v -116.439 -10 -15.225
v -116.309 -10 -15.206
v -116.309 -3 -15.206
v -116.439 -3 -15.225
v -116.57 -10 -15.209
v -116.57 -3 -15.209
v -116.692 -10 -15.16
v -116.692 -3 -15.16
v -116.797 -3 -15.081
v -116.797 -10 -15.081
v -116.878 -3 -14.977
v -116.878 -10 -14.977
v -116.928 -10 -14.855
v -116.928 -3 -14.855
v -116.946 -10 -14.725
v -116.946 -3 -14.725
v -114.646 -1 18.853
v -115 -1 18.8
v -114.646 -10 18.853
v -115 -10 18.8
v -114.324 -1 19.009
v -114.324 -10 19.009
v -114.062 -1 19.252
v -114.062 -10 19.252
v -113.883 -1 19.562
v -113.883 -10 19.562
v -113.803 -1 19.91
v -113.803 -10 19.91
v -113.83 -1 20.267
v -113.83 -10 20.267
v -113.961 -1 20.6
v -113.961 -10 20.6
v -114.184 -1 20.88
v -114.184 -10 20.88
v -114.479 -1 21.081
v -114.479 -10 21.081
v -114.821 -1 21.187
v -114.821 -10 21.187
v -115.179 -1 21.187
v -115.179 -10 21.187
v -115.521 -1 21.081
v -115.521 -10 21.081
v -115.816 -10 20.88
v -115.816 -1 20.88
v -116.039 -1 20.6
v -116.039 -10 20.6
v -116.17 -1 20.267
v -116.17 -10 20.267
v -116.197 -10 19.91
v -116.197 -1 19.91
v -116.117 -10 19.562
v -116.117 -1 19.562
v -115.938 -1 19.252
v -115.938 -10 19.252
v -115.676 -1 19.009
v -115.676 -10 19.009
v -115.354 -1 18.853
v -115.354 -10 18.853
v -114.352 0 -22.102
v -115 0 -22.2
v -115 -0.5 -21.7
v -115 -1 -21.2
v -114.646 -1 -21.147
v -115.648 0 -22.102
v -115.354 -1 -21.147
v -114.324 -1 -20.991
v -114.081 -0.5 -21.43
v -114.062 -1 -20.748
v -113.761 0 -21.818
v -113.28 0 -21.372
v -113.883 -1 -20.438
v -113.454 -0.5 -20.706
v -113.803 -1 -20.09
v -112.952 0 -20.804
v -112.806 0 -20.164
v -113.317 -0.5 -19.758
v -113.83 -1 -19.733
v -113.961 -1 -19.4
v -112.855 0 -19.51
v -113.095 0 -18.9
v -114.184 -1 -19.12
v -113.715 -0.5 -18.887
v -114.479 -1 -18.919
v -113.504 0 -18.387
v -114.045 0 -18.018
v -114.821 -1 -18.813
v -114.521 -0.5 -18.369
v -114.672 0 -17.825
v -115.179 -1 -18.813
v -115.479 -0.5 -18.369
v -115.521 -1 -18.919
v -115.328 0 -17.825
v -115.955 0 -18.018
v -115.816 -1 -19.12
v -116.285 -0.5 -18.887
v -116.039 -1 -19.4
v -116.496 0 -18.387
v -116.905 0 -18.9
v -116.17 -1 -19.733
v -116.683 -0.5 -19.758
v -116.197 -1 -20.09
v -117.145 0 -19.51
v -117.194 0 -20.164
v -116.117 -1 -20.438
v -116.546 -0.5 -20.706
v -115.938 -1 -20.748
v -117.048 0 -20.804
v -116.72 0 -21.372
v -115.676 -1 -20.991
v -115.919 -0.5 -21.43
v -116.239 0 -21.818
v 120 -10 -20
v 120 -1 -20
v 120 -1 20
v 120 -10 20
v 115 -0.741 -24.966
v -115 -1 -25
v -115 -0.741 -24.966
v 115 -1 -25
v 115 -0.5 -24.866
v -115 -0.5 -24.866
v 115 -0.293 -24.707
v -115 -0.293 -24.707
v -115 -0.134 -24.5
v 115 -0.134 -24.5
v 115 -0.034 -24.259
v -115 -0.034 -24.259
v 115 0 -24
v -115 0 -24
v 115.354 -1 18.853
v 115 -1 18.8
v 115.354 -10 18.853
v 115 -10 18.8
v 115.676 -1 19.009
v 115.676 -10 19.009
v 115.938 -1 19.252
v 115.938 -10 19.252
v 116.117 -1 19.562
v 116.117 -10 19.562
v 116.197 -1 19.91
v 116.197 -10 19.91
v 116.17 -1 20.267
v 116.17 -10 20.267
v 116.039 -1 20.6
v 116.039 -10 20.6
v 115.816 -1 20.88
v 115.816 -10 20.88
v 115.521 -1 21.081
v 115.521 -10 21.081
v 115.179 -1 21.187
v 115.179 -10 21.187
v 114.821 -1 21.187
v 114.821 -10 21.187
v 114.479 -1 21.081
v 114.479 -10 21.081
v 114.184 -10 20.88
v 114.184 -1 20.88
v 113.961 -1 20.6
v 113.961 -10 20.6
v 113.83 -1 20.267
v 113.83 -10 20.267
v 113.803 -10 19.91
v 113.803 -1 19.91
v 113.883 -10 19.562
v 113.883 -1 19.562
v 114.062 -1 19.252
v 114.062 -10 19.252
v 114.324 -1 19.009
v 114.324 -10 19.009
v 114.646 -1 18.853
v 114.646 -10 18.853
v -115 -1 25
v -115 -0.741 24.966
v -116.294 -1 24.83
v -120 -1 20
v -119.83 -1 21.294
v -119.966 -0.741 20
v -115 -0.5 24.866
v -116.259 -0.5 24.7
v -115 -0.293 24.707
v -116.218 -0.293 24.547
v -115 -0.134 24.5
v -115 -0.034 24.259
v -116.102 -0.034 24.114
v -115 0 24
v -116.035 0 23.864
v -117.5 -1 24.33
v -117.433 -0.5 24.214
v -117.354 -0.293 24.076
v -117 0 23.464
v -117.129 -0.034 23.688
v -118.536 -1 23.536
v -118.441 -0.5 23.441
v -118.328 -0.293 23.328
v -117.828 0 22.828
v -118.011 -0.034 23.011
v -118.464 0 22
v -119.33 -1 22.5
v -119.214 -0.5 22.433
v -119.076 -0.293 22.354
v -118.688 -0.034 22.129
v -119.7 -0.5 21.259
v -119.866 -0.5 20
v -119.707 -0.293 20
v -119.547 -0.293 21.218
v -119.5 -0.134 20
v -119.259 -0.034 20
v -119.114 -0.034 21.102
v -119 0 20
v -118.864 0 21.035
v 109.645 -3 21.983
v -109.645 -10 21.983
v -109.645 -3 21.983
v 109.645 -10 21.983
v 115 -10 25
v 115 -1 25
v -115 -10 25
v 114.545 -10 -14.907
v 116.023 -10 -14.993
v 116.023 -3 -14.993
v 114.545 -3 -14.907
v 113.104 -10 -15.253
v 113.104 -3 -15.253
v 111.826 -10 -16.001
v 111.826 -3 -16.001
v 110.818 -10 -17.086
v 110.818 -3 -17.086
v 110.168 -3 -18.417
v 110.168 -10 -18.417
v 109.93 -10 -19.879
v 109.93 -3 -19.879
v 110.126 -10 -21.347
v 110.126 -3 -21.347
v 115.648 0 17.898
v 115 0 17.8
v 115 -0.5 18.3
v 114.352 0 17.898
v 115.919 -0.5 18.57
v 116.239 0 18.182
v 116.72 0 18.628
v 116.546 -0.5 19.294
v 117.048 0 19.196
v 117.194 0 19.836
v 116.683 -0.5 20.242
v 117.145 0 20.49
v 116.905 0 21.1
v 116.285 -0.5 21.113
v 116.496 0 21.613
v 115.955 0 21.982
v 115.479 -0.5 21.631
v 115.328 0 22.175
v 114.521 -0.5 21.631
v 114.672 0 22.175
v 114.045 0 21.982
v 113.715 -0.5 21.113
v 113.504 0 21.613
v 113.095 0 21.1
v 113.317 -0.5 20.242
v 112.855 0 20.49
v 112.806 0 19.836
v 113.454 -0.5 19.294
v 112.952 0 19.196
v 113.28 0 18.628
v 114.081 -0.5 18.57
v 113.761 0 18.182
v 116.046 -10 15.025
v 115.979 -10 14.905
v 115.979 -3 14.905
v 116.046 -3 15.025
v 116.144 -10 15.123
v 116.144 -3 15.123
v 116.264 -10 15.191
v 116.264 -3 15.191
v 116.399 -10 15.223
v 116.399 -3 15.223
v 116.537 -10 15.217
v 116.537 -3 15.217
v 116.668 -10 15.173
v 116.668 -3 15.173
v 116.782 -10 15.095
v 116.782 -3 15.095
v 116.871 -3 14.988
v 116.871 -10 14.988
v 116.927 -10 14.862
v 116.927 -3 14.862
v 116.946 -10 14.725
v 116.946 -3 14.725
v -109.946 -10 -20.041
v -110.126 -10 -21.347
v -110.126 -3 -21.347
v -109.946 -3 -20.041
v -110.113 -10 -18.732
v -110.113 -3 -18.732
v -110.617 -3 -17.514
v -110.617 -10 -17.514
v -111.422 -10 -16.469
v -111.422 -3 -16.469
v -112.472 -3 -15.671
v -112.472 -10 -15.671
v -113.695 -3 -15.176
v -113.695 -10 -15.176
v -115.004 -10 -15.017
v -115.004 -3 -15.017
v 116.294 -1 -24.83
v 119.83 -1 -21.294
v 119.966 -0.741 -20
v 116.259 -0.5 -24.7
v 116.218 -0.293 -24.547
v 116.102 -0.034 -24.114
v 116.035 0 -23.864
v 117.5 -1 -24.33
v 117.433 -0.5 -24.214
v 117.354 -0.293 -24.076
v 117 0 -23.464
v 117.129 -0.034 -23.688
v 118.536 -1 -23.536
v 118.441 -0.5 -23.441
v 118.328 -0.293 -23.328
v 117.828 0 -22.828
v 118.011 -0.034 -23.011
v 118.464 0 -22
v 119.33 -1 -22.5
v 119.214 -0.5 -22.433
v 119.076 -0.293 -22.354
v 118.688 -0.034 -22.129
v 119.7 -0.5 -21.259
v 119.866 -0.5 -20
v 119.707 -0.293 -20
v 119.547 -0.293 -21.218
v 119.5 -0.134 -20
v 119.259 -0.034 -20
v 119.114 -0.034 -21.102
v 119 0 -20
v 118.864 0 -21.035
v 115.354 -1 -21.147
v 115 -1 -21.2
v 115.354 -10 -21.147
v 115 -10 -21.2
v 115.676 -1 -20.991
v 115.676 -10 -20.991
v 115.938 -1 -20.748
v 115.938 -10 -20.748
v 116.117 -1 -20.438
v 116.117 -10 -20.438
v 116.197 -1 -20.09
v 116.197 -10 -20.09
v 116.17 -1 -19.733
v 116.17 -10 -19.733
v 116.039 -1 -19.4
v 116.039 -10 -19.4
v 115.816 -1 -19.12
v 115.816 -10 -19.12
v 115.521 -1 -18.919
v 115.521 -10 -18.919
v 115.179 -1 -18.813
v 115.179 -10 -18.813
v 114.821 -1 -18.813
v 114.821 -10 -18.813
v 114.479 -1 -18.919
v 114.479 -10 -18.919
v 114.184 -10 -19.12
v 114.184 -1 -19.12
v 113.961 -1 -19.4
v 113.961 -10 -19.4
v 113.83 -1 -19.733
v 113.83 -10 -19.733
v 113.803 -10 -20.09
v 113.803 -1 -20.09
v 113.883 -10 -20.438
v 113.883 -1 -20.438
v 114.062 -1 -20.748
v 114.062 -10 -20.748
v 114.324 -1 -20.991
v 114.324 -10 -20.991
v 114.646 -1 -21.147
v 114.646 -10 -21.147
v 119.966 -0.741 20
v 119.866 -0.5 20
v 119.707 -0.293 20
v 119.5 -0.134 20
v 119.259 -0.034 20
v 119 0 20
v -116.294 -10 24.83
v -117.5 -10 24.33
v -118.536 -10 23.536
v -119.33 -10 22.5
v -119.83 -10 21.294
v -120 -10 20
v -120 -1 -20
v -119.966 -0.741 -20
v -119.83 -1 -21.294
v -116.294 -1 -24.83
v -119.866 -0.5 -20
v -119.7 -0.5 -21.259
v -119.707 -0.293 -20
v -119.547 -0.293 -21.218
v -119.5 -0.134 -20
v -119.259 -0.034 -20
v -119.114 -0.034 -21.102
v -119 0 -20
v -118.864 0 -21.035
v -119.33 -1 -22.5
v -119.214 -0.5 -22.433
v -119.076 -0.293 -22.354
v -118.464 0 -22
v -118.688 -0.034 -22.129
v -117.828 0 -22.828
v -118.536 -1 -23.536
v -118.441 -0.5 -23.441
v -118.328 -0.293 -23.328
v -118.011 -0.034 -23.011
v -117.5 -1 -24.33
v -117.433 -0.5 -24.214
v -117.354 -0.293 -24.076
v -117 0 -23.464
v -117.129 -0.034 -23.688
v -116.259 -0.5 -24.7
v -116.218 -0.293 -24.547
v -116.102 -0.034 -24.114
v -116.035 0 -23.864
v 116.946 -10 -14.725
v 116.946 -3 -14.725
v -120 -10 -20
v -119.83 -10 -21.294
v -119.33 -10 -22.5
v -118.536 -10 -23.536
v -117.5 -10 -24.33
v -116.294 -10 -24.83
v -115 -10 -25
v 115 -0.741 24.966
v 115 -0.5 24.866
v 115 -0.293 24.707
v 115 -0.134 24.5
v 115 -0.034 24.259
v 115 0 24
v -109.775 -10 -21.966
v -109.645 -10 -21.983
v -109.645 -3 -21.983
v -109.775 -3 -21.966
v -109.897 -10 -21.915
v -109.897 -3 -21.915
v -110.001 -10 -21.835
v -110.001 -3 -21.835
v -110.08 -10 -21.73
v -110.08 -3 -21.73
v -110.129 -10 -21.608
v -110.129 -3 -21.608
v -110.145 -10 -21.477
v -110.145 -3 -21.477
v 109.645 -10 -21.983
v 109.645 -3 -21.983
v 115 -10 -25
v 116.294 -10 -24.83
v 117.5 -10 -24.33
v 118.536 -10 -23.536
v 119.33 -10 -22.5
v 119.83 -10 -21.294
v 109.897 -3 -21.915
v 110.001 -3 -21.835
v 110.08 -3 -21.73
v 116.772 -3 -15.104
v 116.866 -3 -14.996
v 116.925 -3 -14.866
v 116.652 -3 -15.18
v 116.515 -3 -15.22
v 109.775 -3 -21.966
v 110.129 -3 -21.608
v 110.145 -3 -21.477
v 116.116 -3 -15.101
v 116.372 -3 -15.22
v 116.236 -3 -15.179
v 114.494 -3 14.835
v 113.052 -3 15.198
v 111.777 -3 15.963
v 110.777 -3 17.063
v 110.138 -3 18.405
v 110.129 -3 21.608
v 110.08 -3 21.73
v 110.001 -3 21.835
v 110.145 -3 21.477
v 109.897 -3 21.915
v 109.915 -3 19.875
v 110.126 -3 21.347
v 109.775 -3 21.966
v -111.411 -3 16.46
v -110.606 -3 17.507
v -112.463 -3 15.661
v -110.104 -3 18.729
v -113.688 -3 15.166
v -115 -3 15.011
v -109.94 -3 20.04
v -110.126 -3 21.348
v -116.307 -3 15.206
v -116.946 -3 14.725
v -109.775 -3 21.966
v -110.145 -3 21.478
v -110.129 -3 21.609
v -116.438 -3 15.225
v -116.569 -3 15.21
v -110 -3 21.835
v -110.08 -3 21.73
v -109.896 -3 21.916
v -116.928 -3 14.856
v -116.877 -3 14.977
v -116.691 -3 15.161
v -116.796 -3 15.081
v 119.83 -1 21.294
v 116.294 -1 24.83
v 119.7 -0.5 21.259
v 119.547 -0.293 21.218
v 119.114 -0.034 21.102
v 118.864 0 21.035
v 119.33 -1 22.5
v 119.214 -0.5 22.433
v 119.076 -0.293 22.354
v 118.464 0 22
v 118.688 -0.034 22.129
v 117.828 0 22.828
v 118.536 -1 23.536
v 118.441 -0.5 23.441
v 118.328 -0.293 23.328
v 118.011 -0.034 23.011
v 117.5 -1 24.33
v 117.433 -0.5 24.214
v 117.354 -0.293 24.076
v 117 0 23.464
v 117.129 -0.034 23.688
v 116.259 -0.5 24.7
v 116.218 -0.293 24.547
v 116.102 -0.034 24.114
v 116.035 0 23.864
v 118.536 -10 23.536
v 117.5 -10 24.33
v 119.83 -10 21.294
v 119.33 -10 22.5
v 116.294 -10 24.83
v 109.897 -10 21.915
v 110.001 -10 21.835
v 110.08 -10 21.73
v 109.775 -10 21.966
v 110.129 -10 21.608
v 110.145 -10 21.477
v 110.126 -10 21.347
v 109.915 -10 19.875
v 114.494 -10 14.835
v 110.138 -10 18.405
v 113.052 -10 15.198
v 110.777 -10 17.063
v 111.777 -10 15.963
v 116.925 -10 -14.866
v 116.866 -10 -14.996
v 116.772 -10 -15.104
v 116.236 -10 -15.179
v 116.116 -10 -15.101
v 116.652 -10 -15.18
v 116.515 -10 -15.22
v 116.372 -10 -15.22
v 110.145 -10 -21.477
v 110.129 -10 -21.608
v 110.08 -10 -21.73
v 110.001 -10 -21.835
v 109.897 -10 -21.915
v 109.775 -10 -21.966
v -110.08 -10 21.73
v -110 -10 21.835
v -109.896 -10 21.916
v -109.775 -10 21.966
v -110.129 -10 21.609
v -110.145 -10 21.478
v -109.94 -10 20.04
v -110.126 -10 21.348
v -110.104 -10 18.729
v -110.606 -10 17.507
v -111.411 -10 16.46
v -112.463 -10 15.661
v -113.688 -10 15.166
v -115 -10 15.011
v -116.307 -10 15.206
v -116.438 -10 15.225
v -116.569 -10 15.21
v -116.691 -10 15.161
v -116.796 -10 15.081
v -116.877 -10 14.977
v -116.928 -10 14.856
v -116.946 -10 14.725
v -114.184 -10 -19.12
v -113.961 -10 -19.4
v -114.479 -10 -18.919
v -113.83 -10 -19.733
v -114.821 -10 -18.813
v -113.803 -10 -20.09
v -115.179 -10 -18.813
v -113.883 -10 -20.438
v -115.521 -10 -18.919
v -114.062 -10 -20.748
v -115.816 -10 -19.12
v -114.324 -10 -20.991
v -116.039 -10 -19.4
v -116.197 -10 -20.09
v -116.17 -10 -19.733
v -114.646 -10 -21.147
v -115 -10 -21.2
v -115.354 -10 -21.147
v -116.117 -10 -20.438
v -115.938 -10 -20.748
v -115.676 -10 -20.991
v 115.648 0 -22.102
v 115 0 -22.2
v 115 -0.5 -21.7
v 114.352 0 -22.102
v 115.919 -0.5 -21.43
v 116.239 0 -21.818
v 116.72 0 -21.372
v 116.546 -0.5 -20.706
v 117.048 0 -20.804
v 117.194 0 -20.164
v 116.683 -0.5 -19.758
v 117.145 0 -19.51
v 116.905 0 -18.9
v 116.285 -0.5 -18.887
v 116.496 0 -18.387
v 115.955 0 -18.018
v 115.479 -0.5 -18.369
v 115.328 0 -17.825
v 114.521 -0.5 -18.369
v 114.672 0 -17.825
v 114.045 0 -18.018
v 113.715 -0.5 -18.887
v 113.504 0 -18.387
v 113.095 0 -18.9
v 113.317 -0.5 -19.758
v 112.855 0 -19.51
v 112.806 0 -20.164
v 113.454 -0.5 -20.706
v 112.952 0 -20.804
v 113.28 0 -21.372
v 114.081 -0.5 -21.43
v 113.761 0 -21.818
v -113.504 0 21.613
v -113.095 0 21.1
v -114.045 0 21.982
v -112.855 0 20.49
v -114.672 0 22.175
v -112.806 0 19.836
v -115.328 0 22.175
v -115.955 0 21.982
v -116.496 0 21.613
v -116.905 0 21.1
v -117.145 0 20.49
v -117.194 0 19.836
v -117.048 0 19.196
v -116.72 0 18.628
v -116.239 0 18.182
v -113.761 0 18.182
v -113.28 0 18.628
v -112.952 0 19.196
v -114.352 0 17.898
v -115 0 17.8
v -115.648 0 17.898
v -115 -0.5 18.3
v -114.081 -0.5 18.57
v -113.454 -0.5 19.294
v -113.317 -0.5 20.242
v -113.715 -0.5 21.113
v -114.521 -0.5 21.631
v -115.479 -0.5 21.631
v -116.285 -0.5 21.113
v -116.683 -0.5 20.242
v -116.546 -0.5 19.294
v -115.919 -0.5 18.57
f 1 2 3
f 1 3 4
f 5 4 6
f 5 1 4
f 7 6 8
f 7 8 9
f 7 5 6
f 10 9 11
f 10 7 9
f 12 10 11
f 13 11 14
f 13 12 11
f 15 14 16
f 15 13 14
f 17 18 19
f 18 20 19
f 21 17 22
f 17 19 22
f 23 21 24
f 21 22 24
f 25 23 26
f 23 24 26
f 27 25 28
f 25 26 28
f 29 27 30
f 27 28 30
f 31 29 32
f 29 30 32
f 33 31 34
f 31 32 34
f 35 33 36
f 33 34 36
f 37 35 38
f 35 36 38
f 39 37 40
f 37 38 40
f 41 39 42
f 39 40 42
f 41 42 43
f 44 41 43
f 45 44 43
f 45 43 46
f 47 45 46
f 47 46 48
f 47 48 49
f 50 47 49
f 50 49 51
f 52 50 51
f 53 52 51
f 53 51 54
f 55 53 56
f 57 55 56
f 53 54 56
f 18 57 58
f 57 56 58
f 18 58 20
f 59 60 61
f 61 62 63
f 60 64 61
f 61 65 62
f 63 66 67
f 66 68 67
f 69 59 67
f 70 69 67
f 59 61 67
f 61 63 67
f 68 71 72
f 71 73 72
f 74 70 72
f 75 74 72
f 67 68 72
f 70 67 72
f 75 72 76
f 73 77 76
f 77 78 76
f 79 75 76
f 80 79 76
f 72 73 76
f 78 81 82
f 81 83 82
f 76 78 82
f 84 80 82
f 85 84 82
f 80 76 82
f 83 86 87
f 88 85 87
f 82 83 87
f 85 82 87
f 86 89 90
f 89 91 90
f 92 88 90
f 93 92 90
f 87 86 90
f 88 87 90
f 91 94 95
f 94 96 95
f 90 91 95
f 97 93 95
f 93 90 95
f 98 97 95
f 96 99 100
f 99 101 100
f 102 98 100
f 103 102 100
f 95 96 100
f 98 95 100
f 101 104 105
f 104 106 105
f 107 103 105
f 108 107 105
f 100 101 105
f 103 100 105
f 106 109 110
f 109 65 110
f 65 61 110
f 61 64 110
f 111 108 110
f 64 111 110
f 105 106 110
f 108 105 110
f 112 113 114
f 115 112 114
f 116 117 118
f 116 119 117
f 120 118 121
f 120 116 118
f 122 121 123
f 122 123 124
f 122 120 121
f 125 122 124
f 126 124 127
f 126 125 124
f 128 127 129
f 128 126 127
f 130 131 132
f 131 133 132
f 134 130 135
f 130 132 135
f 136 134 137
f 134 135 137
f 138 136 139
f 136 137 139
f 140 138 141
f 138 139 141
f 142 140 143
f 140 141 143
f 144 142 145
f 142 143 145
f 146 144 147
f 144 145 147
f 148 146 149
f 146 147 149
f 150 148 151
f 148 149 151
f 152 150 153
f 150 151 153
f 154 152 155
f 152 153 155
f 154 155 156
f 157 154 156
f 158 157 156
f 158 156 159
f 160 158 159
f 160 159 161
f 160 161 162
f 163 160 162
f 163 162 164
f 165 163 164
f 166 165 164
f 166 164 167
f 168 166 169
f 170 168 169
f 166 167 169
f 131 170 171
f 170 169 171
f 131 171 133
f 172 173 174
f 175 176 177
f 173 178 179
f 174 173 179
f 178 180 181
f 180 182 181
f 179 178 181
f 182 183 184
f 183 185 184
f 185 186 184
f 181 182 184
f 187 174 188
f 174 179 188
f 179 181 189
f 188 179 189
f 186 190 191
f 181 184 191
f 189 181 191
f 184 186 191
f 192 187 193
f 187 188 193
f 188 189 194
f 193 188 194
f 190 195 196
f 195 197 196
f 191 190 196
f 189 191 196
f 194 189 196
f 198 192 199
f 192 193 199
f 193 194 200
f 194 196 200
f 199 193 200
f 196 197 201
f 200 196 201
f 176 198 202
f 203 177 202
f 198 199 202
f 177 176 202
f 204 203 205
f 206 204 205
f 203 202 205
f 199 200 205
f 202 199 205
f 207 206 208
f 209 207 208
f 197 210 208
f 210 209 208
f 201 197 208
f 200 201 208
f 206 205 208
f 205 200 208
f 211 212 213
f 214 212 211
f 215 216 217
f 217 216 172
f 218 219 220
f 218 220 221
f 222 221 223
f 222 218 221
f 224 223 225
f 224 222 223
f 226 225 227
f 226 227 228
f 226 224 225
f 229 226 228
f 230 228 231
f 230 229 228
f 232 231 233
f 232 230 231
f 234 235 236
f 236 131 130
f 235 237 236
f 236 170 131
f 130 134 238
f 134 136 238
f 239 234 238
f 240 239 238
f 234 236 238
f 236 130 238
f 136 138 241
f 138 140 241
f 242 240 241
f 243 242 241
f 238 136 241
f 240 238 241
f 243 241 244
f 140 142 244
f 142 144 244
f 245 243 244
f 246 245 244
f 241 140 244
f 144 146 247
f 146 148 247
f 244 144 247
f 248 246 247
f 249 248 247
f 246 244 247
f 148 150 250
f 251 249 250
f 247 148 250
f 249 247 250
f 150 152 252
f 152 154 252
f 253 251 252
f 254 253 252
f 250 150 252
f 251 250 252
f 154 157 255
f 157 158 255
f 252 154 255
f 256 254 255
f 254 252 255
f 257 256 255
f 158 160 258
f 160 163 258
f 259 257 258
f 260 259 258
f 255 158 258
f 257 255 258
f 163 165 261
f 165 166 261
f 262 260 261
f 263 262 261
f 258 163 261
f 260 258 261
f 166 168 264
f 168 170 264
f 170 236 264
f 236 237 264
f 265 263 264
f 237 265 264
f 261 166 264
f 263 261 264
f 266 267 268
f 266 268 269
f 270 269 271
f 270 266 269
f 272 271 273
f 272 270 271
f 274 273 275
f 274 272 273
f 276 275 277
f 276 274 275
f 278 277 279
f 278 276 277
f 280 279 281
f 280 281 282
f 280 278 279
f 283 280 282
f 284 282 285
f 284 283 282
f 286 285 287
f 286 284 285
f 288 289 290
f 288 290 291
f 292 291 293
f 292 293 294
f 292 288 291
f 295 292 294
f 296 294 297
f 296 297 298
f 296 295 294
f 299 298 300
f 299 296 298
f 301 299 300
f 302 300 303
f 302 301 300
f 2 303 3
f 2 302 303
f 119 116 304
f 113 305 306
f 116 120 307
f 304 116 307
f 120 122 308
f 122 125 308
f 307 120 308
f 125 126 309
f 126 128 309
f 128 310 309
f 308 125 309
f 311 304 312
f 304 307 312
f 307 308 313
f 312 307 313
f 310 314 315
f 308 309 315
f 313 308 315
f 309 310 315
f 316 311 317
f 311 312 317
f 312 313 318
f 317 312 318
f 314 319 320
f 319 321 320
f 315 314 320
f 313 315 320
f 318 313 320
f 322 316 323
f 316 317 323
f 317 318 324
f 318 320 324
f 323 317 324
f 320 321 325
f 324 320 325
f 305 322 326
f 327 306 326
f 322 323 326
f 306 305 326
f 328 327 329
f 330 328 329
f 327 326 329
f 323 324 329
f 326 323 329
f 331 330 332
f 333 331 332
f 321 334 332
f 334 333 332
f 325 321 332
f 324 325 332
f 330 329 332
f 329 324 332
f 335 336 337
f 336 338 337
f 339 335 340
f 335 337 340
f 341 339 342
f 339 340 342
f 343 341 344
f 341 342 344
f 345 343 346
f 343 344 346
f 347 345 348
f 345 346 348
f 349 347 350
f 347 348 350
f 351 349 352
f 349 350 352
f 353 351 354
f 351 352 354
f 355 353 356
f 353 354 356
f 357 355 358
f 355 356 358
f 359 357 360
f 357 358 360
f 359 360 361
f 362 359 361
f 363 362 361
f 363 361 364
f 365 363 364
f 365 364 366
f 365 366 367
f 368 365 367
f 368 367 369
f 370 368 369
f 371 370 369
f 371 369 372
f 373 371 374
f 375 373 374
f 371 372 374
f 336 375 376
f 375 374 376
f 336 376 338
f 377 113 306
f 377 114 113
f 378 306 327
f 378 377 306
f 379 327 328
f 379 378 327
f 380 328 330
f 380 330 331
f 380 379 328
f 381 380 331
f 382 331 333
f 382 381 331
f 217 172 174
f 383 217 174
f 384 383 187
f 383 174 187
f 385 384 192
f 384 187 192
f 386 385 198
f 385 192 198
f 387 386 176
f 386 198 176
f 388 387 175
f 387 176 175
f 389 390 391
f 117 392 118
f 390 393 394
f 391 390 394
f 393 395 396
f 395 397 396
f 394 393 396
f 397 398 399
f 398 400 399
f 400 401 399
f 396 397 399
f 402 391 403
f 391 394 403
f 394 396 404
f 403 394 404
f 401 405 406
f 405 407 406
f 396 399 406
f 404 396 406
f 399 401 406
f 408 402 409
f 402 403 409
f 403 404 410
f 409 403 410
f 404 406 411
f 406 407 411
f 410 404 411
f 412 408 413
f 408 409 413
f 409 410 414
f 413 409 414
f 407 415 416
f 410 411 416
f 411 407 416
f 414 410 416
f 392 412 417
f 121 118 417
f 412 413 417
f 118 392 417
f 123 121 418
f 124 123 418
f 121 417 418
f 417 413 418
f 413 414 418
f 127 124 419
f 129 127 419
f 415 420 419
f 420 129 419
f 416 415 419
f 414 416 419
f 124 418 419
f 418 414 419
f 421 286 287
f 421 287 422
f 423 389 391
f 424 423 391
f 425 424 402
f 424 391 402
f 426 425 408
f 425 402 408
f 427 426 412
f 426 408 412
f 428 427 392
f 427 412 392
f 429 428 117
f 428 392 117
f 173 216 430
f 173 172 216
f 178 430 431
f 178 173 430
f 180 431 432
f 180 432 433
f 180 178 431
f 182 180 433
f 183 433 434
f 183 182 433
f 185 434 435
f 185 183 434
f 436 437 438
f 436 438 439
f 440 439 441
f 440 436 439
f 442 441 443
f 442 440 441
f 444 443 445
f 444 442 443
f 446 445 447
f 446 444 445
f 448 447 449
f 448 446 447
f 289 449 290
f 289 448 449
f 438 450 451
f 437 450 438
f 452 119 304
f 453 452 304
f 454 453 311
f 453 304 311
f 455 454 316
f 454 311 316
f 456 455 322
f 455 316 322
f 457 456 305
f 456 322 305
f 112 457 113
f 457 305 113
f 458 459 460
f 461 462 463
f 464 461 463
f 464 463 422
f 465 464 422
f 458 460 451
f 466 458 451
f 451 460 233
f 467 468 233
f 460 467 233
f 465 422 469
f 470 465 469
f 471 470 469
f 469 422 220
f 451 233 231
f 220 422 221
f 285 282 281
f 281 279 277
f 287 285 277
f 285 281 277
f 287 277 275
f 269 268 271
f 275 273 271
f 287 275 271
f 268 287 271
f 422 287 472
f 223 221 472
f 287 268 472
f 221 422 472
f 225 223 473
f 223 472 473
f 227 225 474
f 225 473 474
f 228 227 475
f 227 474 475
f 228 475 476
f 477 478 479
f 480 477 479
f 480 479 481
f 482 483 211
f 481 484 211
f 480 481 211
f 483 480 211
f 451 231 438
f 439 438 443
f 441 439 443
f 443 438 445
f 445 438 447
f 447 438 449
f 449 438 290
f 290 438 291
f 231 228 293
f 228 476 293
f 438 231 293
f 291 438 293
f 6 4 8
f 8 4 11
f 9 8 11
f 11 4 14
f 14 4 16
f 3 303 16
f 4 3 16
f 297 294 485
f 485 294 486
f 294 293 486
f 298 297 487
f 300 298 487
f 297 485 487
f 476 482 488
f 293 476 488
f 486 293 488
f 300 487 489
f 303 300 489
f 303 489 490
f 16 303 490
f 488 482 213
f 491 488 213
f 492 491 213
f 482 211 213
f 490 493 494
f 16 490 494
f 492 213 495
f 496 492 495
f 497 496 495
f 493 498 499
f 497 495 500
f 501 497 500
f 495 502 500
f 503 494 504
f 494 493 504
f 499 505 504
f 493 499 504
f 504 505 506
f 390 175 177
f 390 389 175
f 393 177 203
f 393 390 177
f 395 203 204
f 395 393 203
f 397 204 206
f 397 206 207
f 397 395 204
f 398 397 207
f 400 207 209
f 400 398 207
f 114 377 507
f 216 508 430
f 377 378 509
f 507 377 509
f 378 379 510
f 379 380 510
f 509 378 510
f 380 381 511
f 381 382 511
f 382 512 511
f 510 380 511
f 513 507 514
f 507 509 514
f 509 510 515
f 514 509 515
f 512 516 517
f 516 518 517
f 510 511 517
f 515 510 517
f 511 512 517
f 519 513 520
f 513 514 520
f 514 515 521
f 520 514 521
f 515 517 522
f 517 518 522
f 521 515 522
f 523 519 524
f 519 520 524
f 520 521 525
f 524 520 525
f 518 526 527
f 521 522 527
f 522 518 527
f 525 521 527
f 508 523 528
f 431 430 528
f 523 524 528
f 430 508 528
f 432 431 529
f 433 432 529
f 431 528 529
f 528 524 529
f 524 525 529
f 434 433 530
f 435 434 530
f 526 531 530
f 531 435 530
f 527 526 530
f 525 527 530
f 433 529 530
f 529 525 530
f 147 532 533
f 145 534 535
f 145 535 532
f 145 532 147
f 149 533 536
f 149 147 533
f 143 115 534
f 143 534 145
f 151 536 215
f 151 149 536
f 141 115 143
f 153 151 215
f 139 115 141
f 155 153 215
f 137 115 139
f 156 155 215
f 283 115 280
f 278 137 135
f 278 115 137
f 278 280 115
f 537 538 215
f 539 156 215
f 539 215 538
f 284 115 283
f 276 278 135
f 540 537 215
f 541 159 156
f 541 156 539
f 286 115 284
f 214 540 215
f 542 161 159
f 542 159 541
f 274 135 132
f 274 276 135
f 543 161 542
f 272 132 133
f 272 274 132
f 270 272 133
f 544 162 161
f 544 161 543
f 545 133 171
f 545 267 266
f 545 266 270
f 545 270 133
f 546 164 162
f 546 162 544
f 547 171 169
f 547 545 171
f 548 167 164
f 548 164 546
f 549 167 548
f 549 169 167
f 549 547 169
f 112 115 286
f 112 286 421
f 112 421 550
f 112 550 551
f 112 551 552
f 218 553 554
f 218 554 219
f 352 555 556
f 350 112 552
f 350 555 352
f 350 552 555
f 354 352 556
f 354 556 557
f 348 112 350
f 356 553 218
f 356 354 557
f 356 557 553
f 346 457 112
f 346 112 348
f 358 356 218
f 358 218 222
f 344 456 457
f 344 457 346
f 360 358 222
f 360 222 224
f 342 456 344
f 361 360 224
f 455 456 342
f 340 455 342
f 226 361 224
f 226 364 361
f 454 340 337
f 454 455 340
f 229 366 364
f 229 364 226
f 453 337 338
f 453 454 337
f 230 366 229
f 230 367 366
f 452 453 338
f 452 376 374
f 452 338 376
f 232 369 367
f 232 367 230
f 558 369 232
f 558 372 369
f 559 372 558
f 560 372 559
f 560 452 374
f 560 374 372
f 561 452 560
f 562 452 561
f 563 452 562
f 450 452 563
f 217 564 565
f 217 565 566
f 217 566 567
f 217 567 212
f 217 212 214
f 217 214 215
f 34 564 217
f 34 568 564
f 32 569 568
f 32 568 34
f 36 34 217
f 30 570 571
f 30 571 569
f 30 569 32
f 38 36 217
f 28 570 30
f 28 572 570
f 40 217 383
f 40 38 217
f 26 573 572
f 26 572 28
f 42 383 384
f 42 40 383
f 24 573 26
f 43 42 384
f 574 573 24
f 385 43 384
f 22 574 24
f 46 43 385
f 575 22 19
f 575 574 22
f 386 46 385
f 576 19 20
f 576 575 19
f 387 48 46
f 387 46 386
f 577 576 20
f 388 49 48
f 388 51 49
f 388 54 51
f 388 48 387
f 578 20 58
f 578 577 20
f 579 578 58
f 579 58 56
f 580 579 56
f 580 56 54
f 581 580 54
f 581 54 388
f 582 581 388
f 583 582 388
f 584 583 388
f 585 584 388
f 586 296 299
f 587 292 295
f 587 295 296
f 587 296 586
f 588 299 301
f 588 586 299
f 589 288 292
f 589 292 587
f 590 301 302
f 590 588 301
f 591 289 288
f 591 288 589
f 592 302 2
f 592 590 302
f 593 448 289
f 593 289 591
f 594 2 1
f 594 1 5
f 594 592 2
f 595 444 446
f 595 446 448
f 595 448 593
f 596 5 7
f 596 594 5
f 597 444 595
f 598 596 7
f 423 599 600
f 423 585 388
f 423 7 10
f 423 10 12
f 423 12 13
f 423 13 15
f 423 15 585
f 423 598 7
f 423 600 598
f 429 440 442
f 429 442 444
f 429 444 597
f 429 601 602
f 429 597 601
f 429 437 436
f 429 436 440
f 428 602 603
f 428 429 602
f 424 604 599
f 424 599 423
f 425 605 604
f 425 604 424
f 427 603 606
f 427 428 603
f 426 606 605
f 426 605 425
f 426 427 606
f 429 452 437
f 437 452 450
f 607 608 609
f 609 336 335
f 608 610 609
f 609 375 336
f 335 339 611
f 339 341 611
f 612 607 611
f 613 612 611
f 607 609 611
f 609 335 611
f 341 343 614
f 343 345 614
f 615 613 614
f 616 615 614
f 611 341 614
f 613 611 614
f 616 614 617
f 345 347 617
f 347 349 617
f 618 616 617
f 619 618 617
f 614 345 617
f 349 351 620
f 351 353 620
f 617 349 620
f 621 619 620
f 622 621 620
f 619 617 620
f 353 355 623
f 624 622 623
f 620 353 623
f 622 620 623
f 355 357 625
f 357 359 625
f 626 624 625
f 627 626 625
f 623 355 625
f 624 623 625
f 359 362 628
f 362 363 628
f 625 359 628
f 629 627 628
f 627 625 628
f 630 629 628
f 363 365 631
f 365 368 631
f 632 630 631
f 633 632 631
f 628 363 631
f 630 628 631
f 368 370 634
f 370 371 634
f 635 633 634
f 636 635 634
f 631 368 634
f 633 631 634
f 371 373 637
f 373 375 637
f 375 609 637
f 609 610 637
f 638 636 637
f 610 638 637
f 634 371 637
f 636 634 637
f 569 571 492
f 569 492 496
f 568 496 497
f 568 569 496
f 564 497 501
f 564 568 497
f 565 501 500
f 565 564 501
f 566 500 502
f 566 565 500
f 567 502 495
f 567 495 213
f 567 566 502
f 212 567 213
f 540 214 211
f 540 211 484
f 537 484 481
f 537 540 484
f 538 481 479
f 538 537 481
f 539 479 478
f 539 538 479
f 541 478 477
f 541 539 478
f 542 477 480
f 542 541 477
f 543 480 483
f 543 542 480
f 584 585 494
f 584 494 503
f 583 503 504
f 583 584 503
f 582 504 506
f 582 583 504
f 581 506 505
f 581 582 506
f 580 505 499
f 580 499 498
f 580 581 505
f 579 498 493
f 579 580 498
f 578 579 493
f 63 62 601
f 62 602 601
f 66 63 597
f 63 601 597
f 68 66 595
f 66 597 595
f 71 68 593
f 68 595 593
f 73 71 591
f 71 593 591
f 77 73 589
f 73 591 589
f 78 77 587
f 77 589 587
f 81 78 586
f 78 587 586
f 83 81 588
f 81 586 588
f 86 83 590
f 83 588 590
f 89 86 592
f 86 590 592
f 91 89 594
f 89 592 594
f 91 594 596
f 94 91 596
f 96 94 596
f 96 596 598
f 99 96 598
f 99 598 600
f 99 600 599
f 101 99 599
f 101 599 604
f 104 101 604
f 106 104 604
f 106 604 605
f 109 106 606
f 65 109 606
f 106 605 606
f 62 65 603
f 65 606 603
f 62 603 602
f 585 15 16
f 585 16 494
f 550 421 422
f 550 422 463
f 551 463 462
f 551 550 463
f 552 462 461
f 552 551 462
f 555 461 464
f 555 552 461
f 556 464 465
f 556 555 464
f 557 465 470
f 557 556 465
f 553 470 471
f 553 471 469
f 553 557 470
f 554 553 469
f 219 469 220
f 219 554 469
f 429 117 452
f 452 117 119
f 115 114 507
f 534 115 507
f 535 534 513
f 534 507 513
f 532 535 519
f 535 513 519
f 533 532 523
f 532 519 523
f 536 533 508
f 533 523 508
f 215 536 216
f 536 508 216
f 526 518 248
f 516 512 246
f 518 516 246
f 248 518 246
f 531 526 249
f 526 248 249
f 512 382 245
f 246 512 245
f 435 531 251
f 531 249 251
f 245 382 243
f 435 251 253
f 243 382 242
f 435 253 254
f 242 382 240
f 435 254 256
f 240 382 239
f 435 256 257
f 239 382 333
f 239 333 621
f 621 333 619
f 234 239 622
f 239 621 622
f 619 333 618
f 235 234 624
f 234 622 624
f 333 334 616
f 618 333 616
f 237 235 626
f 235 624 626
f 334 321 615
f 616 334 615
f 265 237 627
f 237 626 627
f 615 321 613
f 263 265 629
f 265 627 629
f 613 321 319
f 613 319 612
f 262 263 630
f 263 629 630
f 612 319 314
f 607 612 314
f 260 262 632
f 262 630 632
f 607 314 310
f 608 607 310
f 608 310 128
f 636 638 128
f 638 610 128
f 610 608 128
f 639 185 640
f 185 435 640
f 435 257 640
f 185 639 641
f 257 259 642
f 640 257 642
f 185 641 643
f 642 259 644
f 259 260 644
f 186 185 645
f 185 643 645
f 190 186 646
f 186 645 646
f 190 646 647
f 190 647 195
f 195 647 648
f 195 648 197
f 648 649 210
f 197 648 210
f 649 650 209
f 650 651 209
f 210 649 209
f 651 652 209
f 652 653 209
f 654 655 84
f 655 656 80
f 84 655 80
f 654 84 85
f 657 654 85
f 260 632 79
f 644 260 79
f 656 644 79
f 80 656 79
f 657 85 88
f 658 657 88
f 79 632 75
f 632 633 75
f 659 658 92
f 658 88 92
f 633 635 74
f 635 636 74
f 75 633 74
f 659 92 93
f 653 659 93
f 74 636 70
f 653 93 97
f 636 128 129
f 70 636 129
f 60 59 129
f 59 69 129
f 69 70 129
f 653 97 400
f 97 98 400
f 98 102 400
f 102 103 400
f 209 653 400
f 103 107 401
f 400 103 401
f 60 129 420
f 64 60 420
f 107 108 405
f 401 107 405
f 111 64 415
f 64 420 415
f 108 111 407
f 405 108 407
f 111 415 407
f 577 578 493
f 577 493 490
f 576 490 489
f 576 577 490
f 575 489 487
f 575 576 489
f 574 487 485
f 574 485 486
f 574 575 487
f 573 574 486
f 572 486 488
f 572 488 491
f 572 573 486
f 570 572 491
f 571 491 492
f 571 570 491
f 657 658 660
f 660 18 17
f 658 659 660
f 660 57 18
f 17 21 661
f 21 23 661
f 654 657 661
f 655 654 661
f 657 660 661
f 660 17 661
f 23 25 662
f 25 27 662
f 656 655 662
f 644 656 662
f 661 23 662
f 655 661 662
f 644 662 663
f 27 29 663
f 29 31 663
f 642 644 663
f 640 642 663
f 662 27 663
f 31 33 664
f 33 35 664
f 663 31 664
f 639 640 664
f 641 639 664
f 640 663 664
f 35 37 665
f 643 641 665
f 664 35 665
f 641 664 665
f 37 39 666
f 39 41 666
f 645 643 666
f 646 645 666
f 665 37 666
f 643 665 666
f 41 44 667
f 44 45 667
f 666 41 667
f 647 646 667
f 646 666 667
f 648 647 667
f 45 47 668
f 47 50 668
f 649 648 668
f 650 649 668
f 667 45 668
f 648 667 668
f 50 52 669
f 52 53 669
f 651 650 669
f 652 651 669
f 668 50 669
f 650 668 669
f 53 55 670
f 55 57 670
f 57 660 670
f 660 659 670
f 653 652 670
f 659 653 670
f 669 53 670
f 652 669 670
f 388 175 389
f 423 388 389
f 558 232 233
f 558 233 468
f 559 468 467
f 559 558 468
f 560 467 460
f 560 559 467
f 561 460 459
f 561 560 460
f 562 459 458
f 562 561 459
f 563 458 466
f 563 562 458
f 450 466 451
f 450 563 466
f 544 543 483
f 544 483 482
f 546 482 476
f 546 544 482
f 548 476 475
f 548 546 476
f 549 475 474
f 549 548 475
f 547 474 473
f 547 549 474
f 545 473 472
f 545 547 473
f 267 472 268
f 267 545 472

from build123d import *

# Parameters (mm, degrees)
BOSS_EXTRUDE1_DEPTH                                 = 10
CUT_EXTRUDE1_DEPTH                                  = 7
CSK_FOR_M2_COUNTERSUNK_FLAT_HEAD_SCREW2_D           = 2.4
CSK_FOR_M2_COUNTERSUNK_FLAT_HEAD_SCREW2_CSINK_D     = 4.4
CSK_FOR_M2_COUNTERSUNK_FLAT_HEAD_SCREW2_CSINK_ANGLE = 90
FILLET1_R                                           = 1


with BuildPart() as part:
    # Sketch1 → Boss-Extrude1 (new body)
    with BuildSketch(Plane(origin=(0, 0, 0), x_dir=(1, 0, 0), z_dir=(0, 1, 0))):
        with BuildLine():
            Line((-115, 25), (115, 25))
            ThreePointArc((115, 25), (118.535533906, 23.535533906), (120, 20))
            Line((120, 20), (120, -20))
            ThreePointArc((120, -20), (118.535533906, -23.535533906), (115, -25))
            Line((115, -25), (-115, -25))
            ThreePointArc((-115, -25), (-118.535533906, -23.535533906), (-120, -20))
            Line((-120, -20), (-120, 20))
            ThreePointArc((-120, 20), (-118.535533906, 23.535533906), (-115, 25))
        make_face()
    extrude(amount=-BOSS_EXTRUDE1_DEPTH)

    # Sketch2 → Cut-Extrude1 (cut)
    with BuildSketch(Plane.XZ.offset(10)):
        with BuildLine():
            ThreePointArc((110.125928985, 21.347074542), (111.23652041, 16.476032992), (115.978966674, 14.904516992))
            ThreePointArc((115.978966674, 14.904516992), (116.536912433, 15.216669336), (116.945654989, 14.725067791))
            Line((116.945654989, 14.725067791), (116.945654989, -14.725067791))
            ThreePointArc((116.945654989, -14.725067791), (116.58492435, -15.205280291), (116.023238809, -14.992583342))
            ThreePointArc((116.023238809, -14.992583342), (111.282334907, -16.506525423), (110.125928985, -21.347074542))
            ThreePointArc((110.125928985, -21.347074542), (110.043745309, -21.784949523), (109.644883292, -21.983438179))
            Line((109.644883292, -21.983438179), (-109.644883292, -21.983438179))
            ThreePointArc((-109.644883292, -21.983438179), (-110.043745309, -21.784949523), (-110.125928985, -21.347074542))
            ThreePointArc((-110.125928985, -21.347074542), (-111.42230579, -16.46889365), (-116.309291353, -15.206113484))
            ThreePointArc((-116.309291353, -15.206113484), (-116.747166334, -15.123929808), (-116.945654989, -14.725067791))
            Line((-116.945654989, -14.725067791), (-116.945654989, 14.725067791))
            ThreePointArc((-116.945654989, 14.725067791), (-116.746289712, 15.124590961), (-116.307179936, 15.205509941))
            ThreePointArc((-116.307179936, 15.205509941), (-111.411229141, 16.459961189), (-110.126182098, 21.347970622))
            ThreePointArc((-110.126182098, 21.347970622), (-110.043464387, 21.78532079), (-109.644883292, 21.983438179))
            Line((-109.644883292, 21.983438179), (109.644883292, 21.983438179))
            ThreePointArc((109.644883292, 21.983438179), (110.043745309, 21.784949523), (110.125928985, 21.347074542))
        make_face()
    extrude(amount=-CUT_EXTRUDE1_DEPTH, mode=Mode.SUBTRACT)

    # CSK for M2 Countersunk Flat Head Screw2 (through all)
    with Locations(Plane(origin=(-115, 0, -20), x_dir=(0, 0, 1), z_dir=(0, 1, 0))):
        with Locations((0, 0), (40, 0), (0, 230), (40, 230)):
            CounterSinkHole(CSK_FOR_M2_COUNTERSUNK_FLAT_HEAD_SCREW2_D / 2, CSK_FOR_M2_COUNTERSUNK_FLAT_HEAD_SCREW2_CSINK_D / 2, counter_sink_angle=CSK_FOR_M2_COUNTERSUNK_FLAT_HEAD_SCREW2_CSINK_ANGLE)

    # Fillet1
    fillet1_edges = [part.edges().sort_by_distance(p)[0] for p in [
        (-120, 0, 0),
        (-118.535533906, 0, -23.535533906),
        (0, 0, -25),
        (118.535533906, 0, -23.535533906),
        (120, 0, 0),
        (118.535533906, 0, 23.535533906),
        (0, 0, 25),
        (-118.535533906, 0, 23.535533906),
    ]]
    fillet(fillet1_edges, radius=FILLET1_R)


solid = part.part
